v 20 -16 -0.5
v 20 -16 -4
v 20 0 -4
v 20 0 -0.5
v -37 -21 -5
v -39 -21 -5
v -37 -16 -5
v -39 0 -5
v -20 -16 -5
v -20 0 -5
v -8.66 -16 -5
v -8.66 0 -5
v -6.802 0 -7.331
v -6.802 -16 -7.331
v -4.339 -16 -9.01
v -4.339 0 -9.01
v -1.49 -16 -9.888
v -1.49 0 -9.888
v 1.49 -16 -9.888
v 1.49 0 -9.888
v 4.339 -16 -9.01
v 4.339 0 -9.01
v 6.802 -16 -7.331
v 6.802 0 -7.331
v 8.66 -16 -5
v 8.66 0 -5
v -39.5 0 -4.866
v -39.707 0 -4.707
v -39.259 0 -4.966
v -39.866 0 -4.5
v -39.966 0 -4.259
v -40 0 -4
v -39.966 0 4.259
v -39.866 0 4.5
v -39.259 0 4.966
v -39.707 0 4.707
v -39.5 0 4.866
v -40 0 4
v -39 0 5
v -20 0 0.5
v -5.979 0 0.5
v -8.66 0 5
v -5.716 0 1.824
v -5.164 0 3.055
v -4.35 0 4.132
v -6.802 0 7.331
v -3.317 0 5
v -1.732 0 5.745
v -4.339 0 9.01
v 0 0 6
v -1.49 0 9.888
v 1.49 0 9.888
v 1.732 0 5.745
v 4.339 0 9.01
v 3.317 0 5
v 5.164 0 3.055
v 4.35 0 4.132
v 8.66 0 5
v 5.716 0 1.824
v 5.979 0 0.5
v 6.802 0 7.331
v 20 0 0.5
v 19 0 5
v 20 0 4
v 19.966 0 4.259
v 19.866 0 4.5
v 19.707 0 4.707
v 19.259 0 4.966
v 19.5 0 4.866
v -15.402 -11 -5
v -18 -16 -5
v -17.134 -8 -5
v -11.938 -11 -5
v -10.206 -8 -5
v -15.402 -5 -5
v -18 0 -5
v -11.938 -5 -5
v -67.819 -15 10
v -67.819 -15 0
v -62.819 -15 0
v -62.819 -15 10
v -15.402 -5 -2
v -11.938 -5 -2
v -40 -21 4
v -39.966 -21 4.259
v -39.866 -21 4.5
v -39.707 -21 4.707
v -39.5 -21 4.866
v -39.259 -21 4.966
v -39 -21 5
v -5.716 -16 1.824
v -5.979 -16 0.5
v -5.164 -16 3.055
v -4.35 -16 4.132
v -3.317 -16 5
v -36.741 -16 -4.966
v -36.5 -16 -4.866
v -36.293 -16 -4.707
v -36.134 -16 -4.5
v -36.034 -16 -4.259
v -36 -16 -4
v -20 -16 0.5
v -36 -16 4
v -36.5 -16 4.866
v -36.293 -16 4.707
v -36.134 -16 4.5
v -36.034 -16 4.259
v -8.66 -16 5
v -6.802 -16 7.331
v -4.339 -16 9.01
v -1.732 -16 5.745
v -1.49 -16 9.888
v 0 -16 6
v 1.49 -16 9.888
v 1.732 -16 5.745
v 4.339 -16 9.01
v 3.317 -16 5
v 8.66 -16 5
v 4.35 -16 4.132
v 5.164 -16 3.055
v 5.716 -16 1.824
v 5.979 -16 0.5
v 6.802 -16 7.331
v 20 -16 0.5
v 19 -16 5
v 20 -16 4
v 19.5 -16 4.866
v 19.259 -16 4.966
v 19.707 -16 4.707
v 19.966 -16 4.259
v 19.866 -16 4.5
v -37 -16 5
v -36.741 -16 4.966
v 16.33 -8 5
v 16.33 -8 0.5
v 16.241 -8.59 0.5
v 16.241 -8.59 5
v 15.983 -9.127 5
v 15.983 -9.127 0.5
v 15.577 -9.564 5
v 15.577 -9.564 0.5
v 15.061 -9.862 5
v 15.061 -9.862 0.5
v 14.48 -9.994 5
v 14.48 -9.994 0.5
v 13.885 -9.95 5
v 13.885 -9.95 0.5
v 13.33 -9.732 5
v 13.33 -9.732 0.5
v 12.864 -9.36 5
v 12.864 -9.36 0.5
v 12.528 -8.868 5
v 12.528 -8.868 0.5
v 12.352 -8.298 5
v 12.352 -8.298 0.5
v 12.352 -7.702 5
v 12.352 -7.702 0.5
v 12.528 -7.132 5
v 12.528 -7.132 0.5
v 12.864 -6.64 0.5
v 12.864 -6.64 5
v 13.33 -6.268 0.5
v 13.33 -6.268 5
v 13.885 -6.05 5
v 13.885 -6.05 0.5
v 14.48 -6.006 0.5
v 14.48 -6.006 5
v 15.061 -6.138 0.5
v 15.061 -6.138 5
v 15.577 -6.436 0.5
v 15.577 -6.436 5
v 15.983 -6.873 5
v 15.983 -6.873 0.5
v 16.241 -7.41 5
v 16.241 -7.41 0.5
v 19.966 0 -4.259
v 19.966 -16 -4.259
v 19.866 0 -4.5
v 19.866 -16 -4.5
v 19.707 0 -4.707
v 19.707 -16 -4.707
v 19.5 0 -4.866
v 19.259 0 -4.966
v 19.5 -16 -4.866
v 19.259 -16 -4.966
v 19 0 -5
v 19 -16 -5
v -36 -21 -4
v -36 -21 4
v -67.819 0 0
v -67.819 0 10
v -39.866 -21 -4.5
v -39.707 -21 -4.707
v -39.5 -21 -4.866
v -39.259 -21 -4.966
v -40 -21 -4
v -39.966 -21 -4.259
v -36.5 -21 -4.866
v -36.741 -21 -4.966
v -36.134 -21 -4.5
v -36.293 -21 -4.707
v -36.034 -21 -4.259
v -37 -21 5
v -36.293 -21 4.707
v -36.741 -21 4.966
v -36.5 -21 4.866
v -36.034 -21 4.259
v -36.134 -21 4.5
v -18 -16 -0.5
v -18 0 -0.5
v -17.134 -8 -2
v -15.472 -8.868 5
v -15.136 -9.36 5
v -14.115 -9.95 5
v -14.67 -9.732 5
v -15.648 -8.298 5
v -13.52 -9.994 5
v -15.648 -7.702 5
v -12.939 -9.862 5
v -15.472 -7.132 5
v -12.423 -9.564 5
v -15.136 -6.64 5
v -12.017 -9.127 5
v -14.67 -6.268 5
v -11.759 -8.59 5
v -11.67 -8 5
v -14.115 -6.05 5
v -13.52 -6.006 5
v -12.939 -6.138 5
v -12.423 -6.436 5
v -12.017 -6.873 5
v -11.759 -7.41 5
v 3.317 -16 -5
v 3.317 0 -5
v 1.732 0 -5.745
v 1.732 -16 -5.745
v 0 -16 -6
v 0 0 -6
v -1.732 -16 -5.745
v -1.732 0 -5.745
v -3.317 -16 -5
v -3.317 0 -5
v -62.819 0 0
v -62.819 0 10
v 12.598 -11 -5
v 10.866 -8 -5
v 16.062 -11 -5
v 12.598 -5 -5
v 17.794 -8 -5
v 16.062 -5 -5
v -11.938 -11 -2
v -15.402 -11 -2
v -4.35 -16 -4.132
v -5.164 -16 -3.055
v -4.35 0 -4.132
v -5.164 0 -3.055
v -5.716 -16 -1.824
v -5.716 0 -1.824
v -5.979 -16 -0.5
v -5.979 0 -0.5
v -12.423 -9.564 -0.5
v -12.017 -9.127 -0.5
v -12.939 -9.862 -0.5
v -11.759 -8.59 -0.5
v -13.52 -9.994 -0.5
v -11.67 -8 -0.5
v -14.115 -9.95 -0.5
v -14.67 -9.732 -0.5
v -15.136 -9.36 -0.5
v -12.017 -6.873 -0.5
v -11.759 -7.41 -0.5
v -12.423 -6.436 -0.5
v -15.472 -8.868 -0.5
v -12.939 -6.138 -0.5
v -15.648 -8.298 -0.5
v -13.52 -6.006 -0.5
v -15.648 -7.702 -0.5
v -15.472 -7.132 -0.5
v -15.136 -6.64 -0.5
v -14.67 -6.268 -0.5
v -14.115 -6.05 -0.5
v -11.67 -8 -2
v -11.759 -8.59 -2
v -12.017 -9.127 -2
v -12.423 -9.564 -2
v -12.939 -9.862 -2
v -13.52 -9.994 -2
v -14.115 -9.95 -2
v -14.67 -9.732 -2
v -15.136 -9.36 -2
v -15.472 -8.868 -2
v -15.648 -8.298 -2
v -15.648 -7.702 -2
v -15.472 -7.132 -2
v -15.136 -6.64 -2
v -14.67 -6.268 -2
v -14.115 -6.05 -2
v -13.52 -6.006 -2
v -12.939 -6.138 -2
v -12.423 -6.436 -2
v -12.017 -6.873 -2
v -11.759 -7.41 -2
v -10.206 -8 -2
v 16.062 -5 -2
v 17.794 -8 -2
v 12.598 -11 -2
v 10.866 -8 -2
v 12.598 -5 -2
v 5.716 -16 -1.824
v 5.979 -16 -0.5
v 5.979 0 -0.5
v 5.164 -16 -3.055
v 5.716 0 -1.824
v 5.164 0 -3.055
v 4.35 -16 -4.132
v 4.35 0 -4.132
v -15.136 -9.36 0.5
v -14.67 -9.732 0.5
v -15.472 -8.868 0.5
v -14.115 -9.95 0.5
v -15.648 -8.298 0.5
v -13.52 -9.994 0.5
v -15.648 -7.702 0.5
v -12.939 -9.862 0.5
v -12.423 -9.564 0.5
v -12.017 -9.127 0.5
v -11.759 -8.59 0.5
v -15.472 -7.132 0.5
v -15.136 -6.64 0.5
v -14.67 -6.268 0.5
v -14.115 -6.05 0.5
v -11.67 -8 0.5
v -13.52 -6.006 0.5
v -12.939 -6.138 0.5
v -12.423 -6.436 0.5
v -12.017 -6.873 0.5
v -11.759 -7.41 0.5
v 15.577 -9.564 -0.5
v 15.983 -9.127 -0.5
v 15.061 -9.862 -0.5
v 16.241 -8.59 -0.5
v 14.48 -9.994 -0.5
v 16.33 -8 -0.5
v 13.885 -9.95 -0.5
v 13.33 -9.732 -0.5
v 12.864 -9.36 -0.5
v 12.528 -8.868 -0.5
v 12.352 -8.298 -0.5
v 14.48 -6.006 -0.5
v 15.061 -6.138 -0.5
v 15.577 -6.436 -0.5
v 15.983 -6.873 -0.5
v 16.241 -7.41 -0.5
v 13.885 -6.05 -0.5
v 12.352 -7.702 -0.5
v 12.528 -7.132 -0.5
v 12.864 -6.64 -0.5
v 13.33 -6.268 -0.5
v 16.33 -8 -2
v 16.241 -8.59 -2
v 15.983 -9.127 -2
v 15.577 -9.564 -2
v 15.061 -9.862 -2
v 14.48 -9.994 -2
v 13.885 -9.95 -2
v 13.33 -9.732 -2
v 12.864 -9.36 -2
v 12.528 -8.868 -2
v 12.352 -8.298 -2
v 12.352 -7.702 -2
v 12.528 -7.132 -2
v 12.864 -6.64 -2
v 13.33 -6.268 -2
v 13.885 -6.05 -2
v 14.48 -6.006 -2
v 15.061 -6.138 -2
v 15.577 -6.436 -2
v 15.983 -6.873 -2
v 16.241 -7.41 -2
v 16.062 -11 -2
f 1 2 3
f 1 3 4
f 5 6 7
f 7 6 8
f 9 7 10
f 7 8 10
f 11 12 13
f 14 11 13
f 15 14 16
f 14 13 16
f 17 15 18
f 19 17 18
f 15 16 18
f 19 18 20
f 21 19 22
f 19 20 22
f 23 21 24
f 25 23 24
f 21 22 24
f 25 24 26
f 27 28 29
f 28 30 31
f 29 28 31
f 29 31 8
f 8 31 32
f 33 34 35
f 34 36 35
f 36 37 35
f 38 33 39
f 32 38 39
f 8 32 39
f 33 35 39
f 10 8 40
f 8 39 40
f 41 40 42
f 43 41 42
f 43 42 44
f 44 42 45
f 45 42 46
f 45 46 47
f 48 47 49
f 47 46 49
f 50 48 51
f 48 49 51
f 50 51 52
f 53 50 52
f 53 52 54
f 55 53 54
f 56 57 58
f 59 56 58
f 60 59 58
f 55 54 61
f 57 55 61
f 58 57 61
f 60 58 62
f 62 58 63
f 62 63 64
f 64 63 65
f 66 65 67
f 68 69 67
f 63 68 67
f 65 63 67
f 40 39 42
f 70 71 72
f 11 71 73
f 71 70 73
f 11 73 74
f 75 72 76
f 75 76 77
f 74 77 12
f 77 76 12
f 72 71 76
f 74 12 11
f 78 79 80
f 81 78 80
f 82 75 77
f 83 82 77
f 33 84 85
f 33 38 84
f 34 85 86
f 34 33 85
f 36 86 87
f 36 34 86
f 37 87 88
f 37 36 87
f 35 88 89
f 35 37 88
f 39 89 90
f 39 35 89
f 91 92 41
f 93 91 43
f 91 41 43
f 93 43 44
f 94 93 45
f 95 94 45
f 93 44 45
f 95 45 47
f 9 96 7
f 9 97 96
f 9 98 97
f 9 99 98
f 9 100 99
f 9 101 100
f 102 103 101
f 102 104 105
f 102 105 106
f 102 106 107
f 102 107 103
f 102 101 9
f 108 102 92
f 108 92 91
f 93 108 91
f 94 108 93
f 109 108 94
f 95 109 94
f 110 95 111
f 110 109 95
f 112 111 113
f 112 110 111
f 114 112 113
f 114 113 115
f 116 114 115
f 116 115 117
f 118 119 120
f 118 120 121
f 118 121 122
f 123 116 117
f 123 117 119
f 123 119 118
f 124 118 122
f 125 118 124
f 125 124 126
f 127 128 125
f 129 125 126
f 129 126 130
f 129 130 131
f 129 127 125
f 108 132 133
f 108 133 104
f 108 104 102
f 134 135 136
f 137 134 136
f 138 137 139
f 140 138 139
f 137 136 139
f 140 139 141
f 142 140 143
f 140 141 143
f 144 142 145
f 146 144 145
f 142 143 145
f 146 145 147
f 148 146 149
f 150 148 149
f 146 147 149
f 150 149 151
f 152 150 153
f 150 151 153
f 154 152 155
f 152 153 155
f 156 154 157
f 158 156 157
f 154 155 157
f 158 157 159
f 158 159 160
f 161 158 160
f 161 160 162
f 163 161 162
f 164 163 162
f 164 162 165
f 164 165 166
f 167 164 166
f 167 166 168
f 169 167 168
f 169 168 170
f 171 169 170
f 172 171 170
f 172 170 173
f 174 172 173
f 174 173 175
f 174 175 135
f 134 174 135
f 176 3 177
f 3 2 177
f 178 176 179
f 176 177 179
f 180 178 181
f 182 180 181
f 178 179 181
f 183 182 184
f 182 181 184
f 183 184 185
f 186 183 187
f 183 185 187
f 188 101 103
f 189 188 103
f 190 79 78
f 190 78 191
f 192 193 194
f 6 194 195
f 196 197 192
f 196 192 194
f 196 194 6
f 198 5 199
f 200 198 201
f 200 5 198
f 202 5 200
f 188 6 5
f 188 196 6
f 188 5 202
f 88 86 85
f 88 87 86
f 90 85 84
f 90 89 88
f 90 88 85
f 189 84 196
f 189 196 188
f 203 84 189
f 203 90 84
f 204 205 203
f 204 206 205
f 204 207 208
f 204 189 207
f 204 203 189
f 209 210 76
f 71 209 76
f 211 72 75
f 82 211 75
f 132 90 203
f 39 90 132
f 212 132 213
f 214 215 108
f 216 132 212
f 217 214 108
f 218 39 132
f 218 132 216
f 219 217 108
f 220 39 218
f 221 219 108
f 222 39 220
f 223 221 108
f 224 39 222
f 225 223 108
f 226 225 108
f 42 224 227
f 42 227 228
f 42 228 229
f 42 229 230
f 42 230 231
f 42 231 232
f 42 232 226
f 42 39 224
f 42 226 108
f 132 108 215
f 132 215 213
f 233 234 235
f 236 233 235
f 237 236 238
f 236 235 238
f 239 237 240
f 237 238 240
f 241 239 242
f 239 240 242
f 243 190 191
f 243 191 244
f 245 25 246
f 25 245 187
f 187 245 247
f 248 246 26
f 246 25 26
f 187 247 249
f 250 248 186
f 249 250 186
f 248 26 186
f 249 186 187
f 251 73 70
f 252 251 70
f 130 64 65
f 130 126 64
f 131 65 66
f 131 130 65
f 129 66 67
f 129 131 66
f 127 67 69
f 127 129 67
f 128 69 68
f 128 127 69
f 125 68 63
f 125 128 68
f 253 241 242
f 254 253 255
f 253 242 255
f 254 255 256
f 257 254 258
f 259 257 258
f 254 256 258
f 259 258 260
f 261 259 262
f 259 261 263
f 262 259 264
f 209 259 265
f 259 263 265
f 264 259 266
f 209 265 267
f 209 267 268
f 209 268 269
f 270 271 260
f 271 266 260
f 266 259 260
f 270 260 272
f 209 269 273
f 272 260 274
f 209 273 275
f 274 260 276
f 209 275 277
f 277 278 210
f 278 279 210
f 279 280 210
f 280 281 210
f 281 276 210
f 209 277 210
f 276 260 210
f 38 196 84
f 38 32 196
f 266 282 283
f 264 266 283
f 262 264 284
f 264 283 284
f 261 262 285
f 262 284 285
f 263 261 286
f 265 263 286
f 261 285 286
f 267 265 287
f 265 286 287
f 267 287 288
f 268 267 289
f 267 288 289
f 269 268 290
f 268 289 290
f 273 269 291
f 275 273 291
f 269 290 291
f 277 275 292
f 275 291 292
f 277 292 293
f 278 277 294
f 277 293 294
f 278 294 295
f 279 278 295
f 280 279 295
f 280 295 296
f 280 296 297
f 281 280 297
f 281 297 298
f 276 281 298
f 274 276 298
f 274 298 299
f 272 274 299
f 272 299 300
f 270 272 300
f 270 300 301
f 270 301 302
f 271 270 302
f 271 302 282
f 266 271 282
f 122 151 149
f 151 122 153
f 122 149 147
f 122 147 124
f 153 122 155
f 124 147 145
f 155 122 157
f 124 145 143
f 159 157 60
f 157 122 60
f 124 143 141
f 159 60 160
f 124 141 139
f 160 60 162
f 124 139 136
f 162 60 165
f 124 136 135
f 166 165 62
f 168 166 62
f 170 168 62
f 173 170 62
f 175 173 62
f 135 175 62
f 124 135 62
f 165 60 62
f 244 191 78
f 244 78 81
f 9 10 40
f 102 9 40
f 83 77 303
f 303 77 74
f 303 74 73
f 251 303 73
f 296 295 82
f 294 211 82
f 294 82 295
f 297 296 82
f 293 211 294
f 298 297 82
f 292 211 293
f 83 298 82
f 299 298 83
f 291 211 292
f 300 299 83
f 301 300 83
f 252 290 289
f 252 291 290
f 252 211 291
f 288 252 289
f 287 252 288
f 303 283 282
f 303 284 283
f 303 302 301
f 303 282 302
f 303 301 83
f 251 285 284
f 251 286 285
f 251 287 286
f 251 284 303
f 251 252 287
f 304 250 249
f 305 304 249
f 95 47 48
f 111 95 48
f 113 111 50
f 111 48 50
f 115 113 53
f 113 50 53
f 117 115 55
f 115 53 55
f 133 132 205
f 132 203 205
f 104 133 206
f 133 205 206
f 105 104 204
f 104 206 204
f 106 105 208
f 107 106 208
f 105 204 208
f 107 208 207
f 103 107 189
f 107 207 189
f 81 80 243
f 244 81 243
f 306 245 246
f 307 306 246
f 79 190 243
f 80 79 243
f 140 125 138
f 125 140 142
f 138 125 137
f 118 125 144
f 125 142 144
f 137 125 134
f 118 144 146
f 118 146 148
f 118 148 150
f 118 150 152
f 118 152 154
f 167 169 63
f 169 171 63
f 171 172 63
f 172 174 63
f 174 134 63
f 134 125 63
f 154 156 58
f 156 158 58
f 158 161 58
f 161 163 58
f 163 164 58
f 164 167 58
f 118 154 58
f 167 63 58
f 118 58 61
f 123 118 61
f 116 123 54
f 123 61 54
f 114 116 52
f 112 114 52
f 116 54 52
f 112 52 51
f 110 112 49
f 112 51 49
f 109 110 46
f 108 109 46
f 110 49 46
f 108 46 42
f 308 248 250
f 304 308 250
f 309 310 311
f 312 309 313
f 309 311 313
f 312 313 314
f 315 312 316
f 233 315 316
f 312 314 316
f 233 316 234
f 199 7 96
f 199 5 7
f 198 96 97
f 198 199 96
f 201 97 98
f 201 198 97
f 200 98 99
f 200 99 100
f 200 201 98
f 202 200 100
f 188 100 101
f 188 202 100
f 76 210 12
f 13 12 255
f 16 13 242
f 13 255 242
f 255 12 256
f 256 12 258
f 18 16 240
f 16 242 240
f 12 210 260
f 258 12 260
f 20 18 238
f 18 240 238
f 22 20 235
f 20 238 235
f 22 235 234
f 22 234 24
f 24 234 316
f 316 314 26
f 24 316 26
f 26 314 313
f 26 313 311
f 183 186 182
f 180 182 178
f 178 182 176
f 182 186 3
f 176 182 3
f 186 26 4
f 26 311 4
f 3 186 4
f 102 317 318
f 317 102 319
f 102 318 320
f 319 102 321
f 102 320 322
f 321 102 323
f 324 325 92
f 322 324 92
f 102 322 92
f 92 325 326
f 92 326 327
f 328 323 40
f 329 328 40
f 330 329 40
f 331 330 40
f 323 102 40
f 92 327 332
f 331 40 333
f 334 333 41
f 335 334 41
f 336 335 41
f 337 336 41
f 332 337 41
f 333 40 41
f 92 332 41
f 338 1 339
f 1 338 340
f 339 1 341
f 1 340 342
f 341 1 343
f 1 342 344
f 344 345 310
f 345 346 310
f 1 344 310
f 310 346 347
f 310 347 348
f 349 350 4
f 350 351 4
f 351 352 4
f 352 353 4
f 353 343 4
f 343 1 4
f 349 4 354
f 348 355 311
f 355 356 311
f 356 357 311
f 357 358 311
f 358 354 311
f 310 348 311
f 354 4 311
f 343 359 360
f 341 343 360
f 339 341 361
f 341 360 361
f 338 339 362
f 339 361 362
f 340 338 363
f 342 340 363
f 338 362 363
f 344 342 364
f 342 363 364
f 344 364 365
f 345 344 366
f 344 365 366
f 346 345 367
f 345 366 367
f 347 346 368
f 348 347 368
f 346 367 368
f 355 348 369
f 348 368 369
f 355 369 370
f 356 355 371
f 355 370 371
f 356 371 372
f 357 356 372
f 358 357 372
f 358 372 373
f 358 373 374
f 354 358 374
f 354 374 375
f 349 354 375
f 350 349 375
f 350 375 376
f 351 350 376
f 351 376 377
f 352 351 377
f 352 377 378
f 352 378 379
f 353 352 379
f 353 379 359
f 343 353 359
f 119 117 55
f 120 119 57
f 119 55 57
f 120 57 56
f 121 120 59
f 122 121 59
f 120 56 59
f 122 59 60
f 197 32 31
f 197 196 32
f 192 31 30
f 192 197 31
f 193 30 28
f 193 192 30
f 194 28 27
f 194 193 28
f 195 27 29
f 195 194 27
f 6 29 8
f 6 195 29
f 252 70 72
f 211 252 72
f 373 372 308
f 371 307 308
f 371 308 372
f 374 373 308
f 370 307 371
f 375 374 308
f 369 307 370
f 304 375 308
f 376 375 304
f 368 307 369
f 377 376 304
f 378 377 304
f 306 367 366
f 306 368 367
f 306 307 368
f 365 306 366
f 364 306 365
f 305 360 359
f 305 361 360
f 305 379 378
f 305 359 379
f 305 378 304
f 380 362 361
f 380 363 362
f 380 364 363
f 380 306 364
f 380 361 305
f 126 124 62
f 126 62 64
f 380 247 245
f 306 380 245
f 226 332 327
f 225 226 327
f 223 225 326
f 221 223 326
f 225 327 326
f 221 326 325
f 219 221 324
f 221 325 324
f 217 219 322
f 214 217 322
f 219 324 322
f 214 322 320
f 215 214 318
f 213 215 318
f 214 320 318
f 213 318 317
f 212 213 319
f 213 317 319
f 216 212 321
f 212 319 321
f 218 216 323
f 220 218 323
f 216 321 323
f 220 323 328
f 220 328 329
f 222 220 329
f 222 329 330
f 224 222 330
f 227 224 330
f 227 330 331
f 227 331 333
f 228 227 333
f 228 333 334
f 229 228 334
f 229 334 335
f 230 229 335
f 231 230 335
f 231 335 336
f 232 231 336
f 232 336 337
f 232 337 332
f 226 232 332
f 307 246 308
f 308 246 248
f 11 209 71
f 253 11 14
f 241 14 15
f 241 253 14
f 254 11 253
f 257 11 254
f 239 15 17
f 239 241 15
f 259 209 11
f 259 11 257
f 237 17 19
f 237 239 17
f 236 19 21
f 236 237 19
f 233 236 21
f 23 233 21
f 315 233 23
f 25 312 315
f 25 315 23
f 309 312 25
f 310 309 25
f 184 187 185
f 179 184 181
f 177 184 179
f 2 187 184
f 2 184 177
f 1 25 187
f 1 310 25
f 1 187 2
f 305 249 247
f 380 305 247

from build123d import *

# Parameters (mm, degrees)
F1_DEPTH  = 16
F2_W      = 4
F2_H      = 10
F3_DEPTH  = 5
F4_R      = 2
F5_DEPTH  = 25
F6_R      = 2
F7_DEPTH  = 3
F8_R      = 1
F8_2_R    = 1
F9_W      = 5
F9_H      = 15
F10_DEPTH = 10


with BuildPart() as f1:
    # F0 (on Front) → F1 (new body)
    with BuildSketch(Plane.XZ):
        with BuildLine():
            ThreePointArc((3.3166247904, 5), (5.1638421749, 3.0552796914), (5.9791303716, 0.5))
            Line((5.9791303716, 0.5), (9.9874921777, 0.5))
            ThreePointArc((9.9874921777, 0.5), (9.5915123797, 2.828938011), (8.6602540378, 5))
            Line((8.6602540378, 5), (3.3166247904, 5))
        make_face()
        with BuildLine():
            ThreePointArc((-3.3166247904, 5), (0, 6), (3.3166247904, 5))
            Line((3.3166247904, 5), (8.6602540378, 5))
            ThreePointArc((8.6602540378, 5), (0, 10), (-8.6602540378, 5))
            Line((-8.6602540378, 5), (-3.3166247904, 5))
        make_face()
        with BuildLine():
            ThreePointArc((8.6602540378, 5), (9.5915123797, 2.828938011), (9.9874921777, 0.5))
            Line((9.9874921777, 0.5), (20, 0.5))
            Line((20, 0.5), (20, 5))
            Line((20, 5), (8.6602540378, 5))
        make_face()
        with BuildLine():
            Line((-9.9874921777, 0.5), (-5.9791303716, 0.5))
            ThreePointArc((-5.9791303716, 0.5), (-5.1638421749, 3.0552796914), (-3.3166247904, 5))
            Line((-3.3166247904, 5), (-8.6602540378, 5))
            ThreePointArc((-8.6602540378, 5), (-9.5915123797, 2.828938011), (-9.9874921777, 0.5))
        make_face()
        with BuildLine():
            Line((-18, 0.5), (-9.9874921777, 0.5))
            ThreePointArc((-9.9874921777, 0.5), (-9.5915123797, 2.828938011), (-8.6602540378, 5))
            Line((-8.6602540378, 5), (-40, 5))
            Line((-40, 5), (-40, -5))
            Line((-40, -5), (-20, -5))
            Line((-20, -5), (-20, -0.5))
            Line((-20, -0.5), (-20, 0.5))
            Line((-20, 0.5), (-18, 0.5))
        make_face()
    extrude(amount=F1_DEPTH)

    # F2 (on face) → F3 (join)
    with BuildSketch(Plane.XZ.offset(16)):
        with Locations((-38, 0)):
            Rectangle(F2_W, F2_H)
    extrude(amount=F3_DEPTH)


with BuildPart() as f1b:
    # F0 (on Front) → F1, piece 2 (new body)
    with BuildSketch(Plane.XZ):
        with BuildLine():
            Line((9.9874921777, -0.5), (5.9791303716, -0.5))
            ThreePointArc((5.9791303716, -0.5), (5.1638421749, -3.0552796914), (3.3166247904, -5))
            Line((3.3166247904, -5), (8.6602540378, -5))
            ThreePointArc((8.6602540378, -5), (9.5915123797, -2.828938011), (9.9874921777, -0.5))
        make_face()
        with BuildLine():
            Line((8.6602540378, -5), (3.3166247904, -5))
            ThreePointArc((3.3166247904, -5), (0, -6), (-3.3166247904, -5))
            Line((-3.3166247904, -5), (-8.6602540378, -5))
            ThreePointArc((-8.6602540378, -5), (0, -10), (8.6602540378, -5))
        make_face()
        with BuildLine():
            Line((20, -0.5), (9.9874921777, -0.5))
            ThreePointArc((9.9874921777, -0.5), (9.5915123797, -2.828938011), (8.6602540378, -5))
            Line((8.6602540378, -5), (20, -5))
            Line((20, -5), (20, -0.5))
        make_face()
        with BuildLine():
            ThreePointArc((-3.3166247904, -5), (-5.1638421749, -3.0552796914), (-5.9791303716, -0.5))
            Line((-5.9791303716, -0.5), (-9.9874921777, -0.5))
            ThreePointArc((-9.9874921777, -0.5), (-9.5915123797, -2.828938011), (-8.6602540378, -5))
            Line((-8.6602540378, -5), (-3.3166247904, -5))
        make_face()
        with BuildLine():
            ThreePointArc((-8.6602540378, -5), (-9.5915123797, -2.828938011), (-9.9874921777, -0.5))
            Line((-9.9874921777, -0.5), (-18, -0.5))
            Line((-18, -0.5), (-18, -5))
            Line((-18, -5), (-8.6602540378, -5))
        make_face()
    extrude(amount=F1_DEPTH)


with BuildPart() as f5_tool:
    # F4 (on face) → F5 (new body)
    with BuildSketch(Plane(origin=(0, 0, -5), x_dir=(1, 0, 0), z_dir=(0, 0, -1))):
        with Locations((-13.6698729811, 8)):
            Circle(F4_R)
        with Locations((14.3301270189, 8)):
            Circle(F4_R)
    extrude(amount=-F5_DEPTH)


with BuildPart() as f1_1:
    add(f1.part)

    # F5: cut by f5_tool
    add(f5_tool.part, mode=Mode.SUBTRACT)

    # F8
    f8_edges = [f1_1.edges().sort_by_distance(p)[0] for p in [
        (20, -8, 5),
        (-40, -10.5, -5),
        (-40, -10.5, 5),
        (-36, -18.5, -5),
        (-36, -18.5, 5),
    ]]
    fillet(f8_edges, radius=F8_R)


with BuildPart() as f1b_1:
    add(f1b.part)

    # F5: cut by f5_tool
    add(f5_tool.part, mode=Mode.SUBTRACT)

    # F6 (on face) → F7 (cut)
    with BuildSketch(Plane(origin=(0, 0, -5), x_dir=(1, 0, 0), z_dir=(0, 0, -1))):
        Polygon((-15.4019237886, 5), (-11.9378221735, 5), (-10.2057713659, 8), (-11.9378221735, 11), (-15.4019237886, 11), (-17.1339745962, 8), align=None)
        with Locations((-13.6698729811, 8)):
            Circle(F6_R, mode=Mode.SUBTRACT)
        Polygon((12.5980762114, 5), (16.0621778265, 5), (17.7942286341, 8), (16.0621778265, 11), (12.5980762114, 11), (10.8660254038, 8), align=None)
        with Locations((14.3301270189, 8)):
            Circle(F6_R, mode=Mode.SUBTRACT)
    extrude(amount=-F7_DEPTH, mode=Mode.SUBTRACT)

    # F8#2
    f8_2_edges = [f1b_1.edges().sort_by_distance(p)[0] for p in [
        (20, -8, -5),
    ]]
    fillet(f8_2_edges, radius=F8_2_R)


with BuildPart() as f10:
    # F9 (on Top) → F10 (new body)
    with BuildSketch(Plane.XY):
        with Locations((-65.3190290928, -7.5)):
            Rectangle(F9_W, F9_H)
    extrude(amount=F10_DEPTH)


solid = Compound([f1_1.part, f1b_1.part, f10.part])
